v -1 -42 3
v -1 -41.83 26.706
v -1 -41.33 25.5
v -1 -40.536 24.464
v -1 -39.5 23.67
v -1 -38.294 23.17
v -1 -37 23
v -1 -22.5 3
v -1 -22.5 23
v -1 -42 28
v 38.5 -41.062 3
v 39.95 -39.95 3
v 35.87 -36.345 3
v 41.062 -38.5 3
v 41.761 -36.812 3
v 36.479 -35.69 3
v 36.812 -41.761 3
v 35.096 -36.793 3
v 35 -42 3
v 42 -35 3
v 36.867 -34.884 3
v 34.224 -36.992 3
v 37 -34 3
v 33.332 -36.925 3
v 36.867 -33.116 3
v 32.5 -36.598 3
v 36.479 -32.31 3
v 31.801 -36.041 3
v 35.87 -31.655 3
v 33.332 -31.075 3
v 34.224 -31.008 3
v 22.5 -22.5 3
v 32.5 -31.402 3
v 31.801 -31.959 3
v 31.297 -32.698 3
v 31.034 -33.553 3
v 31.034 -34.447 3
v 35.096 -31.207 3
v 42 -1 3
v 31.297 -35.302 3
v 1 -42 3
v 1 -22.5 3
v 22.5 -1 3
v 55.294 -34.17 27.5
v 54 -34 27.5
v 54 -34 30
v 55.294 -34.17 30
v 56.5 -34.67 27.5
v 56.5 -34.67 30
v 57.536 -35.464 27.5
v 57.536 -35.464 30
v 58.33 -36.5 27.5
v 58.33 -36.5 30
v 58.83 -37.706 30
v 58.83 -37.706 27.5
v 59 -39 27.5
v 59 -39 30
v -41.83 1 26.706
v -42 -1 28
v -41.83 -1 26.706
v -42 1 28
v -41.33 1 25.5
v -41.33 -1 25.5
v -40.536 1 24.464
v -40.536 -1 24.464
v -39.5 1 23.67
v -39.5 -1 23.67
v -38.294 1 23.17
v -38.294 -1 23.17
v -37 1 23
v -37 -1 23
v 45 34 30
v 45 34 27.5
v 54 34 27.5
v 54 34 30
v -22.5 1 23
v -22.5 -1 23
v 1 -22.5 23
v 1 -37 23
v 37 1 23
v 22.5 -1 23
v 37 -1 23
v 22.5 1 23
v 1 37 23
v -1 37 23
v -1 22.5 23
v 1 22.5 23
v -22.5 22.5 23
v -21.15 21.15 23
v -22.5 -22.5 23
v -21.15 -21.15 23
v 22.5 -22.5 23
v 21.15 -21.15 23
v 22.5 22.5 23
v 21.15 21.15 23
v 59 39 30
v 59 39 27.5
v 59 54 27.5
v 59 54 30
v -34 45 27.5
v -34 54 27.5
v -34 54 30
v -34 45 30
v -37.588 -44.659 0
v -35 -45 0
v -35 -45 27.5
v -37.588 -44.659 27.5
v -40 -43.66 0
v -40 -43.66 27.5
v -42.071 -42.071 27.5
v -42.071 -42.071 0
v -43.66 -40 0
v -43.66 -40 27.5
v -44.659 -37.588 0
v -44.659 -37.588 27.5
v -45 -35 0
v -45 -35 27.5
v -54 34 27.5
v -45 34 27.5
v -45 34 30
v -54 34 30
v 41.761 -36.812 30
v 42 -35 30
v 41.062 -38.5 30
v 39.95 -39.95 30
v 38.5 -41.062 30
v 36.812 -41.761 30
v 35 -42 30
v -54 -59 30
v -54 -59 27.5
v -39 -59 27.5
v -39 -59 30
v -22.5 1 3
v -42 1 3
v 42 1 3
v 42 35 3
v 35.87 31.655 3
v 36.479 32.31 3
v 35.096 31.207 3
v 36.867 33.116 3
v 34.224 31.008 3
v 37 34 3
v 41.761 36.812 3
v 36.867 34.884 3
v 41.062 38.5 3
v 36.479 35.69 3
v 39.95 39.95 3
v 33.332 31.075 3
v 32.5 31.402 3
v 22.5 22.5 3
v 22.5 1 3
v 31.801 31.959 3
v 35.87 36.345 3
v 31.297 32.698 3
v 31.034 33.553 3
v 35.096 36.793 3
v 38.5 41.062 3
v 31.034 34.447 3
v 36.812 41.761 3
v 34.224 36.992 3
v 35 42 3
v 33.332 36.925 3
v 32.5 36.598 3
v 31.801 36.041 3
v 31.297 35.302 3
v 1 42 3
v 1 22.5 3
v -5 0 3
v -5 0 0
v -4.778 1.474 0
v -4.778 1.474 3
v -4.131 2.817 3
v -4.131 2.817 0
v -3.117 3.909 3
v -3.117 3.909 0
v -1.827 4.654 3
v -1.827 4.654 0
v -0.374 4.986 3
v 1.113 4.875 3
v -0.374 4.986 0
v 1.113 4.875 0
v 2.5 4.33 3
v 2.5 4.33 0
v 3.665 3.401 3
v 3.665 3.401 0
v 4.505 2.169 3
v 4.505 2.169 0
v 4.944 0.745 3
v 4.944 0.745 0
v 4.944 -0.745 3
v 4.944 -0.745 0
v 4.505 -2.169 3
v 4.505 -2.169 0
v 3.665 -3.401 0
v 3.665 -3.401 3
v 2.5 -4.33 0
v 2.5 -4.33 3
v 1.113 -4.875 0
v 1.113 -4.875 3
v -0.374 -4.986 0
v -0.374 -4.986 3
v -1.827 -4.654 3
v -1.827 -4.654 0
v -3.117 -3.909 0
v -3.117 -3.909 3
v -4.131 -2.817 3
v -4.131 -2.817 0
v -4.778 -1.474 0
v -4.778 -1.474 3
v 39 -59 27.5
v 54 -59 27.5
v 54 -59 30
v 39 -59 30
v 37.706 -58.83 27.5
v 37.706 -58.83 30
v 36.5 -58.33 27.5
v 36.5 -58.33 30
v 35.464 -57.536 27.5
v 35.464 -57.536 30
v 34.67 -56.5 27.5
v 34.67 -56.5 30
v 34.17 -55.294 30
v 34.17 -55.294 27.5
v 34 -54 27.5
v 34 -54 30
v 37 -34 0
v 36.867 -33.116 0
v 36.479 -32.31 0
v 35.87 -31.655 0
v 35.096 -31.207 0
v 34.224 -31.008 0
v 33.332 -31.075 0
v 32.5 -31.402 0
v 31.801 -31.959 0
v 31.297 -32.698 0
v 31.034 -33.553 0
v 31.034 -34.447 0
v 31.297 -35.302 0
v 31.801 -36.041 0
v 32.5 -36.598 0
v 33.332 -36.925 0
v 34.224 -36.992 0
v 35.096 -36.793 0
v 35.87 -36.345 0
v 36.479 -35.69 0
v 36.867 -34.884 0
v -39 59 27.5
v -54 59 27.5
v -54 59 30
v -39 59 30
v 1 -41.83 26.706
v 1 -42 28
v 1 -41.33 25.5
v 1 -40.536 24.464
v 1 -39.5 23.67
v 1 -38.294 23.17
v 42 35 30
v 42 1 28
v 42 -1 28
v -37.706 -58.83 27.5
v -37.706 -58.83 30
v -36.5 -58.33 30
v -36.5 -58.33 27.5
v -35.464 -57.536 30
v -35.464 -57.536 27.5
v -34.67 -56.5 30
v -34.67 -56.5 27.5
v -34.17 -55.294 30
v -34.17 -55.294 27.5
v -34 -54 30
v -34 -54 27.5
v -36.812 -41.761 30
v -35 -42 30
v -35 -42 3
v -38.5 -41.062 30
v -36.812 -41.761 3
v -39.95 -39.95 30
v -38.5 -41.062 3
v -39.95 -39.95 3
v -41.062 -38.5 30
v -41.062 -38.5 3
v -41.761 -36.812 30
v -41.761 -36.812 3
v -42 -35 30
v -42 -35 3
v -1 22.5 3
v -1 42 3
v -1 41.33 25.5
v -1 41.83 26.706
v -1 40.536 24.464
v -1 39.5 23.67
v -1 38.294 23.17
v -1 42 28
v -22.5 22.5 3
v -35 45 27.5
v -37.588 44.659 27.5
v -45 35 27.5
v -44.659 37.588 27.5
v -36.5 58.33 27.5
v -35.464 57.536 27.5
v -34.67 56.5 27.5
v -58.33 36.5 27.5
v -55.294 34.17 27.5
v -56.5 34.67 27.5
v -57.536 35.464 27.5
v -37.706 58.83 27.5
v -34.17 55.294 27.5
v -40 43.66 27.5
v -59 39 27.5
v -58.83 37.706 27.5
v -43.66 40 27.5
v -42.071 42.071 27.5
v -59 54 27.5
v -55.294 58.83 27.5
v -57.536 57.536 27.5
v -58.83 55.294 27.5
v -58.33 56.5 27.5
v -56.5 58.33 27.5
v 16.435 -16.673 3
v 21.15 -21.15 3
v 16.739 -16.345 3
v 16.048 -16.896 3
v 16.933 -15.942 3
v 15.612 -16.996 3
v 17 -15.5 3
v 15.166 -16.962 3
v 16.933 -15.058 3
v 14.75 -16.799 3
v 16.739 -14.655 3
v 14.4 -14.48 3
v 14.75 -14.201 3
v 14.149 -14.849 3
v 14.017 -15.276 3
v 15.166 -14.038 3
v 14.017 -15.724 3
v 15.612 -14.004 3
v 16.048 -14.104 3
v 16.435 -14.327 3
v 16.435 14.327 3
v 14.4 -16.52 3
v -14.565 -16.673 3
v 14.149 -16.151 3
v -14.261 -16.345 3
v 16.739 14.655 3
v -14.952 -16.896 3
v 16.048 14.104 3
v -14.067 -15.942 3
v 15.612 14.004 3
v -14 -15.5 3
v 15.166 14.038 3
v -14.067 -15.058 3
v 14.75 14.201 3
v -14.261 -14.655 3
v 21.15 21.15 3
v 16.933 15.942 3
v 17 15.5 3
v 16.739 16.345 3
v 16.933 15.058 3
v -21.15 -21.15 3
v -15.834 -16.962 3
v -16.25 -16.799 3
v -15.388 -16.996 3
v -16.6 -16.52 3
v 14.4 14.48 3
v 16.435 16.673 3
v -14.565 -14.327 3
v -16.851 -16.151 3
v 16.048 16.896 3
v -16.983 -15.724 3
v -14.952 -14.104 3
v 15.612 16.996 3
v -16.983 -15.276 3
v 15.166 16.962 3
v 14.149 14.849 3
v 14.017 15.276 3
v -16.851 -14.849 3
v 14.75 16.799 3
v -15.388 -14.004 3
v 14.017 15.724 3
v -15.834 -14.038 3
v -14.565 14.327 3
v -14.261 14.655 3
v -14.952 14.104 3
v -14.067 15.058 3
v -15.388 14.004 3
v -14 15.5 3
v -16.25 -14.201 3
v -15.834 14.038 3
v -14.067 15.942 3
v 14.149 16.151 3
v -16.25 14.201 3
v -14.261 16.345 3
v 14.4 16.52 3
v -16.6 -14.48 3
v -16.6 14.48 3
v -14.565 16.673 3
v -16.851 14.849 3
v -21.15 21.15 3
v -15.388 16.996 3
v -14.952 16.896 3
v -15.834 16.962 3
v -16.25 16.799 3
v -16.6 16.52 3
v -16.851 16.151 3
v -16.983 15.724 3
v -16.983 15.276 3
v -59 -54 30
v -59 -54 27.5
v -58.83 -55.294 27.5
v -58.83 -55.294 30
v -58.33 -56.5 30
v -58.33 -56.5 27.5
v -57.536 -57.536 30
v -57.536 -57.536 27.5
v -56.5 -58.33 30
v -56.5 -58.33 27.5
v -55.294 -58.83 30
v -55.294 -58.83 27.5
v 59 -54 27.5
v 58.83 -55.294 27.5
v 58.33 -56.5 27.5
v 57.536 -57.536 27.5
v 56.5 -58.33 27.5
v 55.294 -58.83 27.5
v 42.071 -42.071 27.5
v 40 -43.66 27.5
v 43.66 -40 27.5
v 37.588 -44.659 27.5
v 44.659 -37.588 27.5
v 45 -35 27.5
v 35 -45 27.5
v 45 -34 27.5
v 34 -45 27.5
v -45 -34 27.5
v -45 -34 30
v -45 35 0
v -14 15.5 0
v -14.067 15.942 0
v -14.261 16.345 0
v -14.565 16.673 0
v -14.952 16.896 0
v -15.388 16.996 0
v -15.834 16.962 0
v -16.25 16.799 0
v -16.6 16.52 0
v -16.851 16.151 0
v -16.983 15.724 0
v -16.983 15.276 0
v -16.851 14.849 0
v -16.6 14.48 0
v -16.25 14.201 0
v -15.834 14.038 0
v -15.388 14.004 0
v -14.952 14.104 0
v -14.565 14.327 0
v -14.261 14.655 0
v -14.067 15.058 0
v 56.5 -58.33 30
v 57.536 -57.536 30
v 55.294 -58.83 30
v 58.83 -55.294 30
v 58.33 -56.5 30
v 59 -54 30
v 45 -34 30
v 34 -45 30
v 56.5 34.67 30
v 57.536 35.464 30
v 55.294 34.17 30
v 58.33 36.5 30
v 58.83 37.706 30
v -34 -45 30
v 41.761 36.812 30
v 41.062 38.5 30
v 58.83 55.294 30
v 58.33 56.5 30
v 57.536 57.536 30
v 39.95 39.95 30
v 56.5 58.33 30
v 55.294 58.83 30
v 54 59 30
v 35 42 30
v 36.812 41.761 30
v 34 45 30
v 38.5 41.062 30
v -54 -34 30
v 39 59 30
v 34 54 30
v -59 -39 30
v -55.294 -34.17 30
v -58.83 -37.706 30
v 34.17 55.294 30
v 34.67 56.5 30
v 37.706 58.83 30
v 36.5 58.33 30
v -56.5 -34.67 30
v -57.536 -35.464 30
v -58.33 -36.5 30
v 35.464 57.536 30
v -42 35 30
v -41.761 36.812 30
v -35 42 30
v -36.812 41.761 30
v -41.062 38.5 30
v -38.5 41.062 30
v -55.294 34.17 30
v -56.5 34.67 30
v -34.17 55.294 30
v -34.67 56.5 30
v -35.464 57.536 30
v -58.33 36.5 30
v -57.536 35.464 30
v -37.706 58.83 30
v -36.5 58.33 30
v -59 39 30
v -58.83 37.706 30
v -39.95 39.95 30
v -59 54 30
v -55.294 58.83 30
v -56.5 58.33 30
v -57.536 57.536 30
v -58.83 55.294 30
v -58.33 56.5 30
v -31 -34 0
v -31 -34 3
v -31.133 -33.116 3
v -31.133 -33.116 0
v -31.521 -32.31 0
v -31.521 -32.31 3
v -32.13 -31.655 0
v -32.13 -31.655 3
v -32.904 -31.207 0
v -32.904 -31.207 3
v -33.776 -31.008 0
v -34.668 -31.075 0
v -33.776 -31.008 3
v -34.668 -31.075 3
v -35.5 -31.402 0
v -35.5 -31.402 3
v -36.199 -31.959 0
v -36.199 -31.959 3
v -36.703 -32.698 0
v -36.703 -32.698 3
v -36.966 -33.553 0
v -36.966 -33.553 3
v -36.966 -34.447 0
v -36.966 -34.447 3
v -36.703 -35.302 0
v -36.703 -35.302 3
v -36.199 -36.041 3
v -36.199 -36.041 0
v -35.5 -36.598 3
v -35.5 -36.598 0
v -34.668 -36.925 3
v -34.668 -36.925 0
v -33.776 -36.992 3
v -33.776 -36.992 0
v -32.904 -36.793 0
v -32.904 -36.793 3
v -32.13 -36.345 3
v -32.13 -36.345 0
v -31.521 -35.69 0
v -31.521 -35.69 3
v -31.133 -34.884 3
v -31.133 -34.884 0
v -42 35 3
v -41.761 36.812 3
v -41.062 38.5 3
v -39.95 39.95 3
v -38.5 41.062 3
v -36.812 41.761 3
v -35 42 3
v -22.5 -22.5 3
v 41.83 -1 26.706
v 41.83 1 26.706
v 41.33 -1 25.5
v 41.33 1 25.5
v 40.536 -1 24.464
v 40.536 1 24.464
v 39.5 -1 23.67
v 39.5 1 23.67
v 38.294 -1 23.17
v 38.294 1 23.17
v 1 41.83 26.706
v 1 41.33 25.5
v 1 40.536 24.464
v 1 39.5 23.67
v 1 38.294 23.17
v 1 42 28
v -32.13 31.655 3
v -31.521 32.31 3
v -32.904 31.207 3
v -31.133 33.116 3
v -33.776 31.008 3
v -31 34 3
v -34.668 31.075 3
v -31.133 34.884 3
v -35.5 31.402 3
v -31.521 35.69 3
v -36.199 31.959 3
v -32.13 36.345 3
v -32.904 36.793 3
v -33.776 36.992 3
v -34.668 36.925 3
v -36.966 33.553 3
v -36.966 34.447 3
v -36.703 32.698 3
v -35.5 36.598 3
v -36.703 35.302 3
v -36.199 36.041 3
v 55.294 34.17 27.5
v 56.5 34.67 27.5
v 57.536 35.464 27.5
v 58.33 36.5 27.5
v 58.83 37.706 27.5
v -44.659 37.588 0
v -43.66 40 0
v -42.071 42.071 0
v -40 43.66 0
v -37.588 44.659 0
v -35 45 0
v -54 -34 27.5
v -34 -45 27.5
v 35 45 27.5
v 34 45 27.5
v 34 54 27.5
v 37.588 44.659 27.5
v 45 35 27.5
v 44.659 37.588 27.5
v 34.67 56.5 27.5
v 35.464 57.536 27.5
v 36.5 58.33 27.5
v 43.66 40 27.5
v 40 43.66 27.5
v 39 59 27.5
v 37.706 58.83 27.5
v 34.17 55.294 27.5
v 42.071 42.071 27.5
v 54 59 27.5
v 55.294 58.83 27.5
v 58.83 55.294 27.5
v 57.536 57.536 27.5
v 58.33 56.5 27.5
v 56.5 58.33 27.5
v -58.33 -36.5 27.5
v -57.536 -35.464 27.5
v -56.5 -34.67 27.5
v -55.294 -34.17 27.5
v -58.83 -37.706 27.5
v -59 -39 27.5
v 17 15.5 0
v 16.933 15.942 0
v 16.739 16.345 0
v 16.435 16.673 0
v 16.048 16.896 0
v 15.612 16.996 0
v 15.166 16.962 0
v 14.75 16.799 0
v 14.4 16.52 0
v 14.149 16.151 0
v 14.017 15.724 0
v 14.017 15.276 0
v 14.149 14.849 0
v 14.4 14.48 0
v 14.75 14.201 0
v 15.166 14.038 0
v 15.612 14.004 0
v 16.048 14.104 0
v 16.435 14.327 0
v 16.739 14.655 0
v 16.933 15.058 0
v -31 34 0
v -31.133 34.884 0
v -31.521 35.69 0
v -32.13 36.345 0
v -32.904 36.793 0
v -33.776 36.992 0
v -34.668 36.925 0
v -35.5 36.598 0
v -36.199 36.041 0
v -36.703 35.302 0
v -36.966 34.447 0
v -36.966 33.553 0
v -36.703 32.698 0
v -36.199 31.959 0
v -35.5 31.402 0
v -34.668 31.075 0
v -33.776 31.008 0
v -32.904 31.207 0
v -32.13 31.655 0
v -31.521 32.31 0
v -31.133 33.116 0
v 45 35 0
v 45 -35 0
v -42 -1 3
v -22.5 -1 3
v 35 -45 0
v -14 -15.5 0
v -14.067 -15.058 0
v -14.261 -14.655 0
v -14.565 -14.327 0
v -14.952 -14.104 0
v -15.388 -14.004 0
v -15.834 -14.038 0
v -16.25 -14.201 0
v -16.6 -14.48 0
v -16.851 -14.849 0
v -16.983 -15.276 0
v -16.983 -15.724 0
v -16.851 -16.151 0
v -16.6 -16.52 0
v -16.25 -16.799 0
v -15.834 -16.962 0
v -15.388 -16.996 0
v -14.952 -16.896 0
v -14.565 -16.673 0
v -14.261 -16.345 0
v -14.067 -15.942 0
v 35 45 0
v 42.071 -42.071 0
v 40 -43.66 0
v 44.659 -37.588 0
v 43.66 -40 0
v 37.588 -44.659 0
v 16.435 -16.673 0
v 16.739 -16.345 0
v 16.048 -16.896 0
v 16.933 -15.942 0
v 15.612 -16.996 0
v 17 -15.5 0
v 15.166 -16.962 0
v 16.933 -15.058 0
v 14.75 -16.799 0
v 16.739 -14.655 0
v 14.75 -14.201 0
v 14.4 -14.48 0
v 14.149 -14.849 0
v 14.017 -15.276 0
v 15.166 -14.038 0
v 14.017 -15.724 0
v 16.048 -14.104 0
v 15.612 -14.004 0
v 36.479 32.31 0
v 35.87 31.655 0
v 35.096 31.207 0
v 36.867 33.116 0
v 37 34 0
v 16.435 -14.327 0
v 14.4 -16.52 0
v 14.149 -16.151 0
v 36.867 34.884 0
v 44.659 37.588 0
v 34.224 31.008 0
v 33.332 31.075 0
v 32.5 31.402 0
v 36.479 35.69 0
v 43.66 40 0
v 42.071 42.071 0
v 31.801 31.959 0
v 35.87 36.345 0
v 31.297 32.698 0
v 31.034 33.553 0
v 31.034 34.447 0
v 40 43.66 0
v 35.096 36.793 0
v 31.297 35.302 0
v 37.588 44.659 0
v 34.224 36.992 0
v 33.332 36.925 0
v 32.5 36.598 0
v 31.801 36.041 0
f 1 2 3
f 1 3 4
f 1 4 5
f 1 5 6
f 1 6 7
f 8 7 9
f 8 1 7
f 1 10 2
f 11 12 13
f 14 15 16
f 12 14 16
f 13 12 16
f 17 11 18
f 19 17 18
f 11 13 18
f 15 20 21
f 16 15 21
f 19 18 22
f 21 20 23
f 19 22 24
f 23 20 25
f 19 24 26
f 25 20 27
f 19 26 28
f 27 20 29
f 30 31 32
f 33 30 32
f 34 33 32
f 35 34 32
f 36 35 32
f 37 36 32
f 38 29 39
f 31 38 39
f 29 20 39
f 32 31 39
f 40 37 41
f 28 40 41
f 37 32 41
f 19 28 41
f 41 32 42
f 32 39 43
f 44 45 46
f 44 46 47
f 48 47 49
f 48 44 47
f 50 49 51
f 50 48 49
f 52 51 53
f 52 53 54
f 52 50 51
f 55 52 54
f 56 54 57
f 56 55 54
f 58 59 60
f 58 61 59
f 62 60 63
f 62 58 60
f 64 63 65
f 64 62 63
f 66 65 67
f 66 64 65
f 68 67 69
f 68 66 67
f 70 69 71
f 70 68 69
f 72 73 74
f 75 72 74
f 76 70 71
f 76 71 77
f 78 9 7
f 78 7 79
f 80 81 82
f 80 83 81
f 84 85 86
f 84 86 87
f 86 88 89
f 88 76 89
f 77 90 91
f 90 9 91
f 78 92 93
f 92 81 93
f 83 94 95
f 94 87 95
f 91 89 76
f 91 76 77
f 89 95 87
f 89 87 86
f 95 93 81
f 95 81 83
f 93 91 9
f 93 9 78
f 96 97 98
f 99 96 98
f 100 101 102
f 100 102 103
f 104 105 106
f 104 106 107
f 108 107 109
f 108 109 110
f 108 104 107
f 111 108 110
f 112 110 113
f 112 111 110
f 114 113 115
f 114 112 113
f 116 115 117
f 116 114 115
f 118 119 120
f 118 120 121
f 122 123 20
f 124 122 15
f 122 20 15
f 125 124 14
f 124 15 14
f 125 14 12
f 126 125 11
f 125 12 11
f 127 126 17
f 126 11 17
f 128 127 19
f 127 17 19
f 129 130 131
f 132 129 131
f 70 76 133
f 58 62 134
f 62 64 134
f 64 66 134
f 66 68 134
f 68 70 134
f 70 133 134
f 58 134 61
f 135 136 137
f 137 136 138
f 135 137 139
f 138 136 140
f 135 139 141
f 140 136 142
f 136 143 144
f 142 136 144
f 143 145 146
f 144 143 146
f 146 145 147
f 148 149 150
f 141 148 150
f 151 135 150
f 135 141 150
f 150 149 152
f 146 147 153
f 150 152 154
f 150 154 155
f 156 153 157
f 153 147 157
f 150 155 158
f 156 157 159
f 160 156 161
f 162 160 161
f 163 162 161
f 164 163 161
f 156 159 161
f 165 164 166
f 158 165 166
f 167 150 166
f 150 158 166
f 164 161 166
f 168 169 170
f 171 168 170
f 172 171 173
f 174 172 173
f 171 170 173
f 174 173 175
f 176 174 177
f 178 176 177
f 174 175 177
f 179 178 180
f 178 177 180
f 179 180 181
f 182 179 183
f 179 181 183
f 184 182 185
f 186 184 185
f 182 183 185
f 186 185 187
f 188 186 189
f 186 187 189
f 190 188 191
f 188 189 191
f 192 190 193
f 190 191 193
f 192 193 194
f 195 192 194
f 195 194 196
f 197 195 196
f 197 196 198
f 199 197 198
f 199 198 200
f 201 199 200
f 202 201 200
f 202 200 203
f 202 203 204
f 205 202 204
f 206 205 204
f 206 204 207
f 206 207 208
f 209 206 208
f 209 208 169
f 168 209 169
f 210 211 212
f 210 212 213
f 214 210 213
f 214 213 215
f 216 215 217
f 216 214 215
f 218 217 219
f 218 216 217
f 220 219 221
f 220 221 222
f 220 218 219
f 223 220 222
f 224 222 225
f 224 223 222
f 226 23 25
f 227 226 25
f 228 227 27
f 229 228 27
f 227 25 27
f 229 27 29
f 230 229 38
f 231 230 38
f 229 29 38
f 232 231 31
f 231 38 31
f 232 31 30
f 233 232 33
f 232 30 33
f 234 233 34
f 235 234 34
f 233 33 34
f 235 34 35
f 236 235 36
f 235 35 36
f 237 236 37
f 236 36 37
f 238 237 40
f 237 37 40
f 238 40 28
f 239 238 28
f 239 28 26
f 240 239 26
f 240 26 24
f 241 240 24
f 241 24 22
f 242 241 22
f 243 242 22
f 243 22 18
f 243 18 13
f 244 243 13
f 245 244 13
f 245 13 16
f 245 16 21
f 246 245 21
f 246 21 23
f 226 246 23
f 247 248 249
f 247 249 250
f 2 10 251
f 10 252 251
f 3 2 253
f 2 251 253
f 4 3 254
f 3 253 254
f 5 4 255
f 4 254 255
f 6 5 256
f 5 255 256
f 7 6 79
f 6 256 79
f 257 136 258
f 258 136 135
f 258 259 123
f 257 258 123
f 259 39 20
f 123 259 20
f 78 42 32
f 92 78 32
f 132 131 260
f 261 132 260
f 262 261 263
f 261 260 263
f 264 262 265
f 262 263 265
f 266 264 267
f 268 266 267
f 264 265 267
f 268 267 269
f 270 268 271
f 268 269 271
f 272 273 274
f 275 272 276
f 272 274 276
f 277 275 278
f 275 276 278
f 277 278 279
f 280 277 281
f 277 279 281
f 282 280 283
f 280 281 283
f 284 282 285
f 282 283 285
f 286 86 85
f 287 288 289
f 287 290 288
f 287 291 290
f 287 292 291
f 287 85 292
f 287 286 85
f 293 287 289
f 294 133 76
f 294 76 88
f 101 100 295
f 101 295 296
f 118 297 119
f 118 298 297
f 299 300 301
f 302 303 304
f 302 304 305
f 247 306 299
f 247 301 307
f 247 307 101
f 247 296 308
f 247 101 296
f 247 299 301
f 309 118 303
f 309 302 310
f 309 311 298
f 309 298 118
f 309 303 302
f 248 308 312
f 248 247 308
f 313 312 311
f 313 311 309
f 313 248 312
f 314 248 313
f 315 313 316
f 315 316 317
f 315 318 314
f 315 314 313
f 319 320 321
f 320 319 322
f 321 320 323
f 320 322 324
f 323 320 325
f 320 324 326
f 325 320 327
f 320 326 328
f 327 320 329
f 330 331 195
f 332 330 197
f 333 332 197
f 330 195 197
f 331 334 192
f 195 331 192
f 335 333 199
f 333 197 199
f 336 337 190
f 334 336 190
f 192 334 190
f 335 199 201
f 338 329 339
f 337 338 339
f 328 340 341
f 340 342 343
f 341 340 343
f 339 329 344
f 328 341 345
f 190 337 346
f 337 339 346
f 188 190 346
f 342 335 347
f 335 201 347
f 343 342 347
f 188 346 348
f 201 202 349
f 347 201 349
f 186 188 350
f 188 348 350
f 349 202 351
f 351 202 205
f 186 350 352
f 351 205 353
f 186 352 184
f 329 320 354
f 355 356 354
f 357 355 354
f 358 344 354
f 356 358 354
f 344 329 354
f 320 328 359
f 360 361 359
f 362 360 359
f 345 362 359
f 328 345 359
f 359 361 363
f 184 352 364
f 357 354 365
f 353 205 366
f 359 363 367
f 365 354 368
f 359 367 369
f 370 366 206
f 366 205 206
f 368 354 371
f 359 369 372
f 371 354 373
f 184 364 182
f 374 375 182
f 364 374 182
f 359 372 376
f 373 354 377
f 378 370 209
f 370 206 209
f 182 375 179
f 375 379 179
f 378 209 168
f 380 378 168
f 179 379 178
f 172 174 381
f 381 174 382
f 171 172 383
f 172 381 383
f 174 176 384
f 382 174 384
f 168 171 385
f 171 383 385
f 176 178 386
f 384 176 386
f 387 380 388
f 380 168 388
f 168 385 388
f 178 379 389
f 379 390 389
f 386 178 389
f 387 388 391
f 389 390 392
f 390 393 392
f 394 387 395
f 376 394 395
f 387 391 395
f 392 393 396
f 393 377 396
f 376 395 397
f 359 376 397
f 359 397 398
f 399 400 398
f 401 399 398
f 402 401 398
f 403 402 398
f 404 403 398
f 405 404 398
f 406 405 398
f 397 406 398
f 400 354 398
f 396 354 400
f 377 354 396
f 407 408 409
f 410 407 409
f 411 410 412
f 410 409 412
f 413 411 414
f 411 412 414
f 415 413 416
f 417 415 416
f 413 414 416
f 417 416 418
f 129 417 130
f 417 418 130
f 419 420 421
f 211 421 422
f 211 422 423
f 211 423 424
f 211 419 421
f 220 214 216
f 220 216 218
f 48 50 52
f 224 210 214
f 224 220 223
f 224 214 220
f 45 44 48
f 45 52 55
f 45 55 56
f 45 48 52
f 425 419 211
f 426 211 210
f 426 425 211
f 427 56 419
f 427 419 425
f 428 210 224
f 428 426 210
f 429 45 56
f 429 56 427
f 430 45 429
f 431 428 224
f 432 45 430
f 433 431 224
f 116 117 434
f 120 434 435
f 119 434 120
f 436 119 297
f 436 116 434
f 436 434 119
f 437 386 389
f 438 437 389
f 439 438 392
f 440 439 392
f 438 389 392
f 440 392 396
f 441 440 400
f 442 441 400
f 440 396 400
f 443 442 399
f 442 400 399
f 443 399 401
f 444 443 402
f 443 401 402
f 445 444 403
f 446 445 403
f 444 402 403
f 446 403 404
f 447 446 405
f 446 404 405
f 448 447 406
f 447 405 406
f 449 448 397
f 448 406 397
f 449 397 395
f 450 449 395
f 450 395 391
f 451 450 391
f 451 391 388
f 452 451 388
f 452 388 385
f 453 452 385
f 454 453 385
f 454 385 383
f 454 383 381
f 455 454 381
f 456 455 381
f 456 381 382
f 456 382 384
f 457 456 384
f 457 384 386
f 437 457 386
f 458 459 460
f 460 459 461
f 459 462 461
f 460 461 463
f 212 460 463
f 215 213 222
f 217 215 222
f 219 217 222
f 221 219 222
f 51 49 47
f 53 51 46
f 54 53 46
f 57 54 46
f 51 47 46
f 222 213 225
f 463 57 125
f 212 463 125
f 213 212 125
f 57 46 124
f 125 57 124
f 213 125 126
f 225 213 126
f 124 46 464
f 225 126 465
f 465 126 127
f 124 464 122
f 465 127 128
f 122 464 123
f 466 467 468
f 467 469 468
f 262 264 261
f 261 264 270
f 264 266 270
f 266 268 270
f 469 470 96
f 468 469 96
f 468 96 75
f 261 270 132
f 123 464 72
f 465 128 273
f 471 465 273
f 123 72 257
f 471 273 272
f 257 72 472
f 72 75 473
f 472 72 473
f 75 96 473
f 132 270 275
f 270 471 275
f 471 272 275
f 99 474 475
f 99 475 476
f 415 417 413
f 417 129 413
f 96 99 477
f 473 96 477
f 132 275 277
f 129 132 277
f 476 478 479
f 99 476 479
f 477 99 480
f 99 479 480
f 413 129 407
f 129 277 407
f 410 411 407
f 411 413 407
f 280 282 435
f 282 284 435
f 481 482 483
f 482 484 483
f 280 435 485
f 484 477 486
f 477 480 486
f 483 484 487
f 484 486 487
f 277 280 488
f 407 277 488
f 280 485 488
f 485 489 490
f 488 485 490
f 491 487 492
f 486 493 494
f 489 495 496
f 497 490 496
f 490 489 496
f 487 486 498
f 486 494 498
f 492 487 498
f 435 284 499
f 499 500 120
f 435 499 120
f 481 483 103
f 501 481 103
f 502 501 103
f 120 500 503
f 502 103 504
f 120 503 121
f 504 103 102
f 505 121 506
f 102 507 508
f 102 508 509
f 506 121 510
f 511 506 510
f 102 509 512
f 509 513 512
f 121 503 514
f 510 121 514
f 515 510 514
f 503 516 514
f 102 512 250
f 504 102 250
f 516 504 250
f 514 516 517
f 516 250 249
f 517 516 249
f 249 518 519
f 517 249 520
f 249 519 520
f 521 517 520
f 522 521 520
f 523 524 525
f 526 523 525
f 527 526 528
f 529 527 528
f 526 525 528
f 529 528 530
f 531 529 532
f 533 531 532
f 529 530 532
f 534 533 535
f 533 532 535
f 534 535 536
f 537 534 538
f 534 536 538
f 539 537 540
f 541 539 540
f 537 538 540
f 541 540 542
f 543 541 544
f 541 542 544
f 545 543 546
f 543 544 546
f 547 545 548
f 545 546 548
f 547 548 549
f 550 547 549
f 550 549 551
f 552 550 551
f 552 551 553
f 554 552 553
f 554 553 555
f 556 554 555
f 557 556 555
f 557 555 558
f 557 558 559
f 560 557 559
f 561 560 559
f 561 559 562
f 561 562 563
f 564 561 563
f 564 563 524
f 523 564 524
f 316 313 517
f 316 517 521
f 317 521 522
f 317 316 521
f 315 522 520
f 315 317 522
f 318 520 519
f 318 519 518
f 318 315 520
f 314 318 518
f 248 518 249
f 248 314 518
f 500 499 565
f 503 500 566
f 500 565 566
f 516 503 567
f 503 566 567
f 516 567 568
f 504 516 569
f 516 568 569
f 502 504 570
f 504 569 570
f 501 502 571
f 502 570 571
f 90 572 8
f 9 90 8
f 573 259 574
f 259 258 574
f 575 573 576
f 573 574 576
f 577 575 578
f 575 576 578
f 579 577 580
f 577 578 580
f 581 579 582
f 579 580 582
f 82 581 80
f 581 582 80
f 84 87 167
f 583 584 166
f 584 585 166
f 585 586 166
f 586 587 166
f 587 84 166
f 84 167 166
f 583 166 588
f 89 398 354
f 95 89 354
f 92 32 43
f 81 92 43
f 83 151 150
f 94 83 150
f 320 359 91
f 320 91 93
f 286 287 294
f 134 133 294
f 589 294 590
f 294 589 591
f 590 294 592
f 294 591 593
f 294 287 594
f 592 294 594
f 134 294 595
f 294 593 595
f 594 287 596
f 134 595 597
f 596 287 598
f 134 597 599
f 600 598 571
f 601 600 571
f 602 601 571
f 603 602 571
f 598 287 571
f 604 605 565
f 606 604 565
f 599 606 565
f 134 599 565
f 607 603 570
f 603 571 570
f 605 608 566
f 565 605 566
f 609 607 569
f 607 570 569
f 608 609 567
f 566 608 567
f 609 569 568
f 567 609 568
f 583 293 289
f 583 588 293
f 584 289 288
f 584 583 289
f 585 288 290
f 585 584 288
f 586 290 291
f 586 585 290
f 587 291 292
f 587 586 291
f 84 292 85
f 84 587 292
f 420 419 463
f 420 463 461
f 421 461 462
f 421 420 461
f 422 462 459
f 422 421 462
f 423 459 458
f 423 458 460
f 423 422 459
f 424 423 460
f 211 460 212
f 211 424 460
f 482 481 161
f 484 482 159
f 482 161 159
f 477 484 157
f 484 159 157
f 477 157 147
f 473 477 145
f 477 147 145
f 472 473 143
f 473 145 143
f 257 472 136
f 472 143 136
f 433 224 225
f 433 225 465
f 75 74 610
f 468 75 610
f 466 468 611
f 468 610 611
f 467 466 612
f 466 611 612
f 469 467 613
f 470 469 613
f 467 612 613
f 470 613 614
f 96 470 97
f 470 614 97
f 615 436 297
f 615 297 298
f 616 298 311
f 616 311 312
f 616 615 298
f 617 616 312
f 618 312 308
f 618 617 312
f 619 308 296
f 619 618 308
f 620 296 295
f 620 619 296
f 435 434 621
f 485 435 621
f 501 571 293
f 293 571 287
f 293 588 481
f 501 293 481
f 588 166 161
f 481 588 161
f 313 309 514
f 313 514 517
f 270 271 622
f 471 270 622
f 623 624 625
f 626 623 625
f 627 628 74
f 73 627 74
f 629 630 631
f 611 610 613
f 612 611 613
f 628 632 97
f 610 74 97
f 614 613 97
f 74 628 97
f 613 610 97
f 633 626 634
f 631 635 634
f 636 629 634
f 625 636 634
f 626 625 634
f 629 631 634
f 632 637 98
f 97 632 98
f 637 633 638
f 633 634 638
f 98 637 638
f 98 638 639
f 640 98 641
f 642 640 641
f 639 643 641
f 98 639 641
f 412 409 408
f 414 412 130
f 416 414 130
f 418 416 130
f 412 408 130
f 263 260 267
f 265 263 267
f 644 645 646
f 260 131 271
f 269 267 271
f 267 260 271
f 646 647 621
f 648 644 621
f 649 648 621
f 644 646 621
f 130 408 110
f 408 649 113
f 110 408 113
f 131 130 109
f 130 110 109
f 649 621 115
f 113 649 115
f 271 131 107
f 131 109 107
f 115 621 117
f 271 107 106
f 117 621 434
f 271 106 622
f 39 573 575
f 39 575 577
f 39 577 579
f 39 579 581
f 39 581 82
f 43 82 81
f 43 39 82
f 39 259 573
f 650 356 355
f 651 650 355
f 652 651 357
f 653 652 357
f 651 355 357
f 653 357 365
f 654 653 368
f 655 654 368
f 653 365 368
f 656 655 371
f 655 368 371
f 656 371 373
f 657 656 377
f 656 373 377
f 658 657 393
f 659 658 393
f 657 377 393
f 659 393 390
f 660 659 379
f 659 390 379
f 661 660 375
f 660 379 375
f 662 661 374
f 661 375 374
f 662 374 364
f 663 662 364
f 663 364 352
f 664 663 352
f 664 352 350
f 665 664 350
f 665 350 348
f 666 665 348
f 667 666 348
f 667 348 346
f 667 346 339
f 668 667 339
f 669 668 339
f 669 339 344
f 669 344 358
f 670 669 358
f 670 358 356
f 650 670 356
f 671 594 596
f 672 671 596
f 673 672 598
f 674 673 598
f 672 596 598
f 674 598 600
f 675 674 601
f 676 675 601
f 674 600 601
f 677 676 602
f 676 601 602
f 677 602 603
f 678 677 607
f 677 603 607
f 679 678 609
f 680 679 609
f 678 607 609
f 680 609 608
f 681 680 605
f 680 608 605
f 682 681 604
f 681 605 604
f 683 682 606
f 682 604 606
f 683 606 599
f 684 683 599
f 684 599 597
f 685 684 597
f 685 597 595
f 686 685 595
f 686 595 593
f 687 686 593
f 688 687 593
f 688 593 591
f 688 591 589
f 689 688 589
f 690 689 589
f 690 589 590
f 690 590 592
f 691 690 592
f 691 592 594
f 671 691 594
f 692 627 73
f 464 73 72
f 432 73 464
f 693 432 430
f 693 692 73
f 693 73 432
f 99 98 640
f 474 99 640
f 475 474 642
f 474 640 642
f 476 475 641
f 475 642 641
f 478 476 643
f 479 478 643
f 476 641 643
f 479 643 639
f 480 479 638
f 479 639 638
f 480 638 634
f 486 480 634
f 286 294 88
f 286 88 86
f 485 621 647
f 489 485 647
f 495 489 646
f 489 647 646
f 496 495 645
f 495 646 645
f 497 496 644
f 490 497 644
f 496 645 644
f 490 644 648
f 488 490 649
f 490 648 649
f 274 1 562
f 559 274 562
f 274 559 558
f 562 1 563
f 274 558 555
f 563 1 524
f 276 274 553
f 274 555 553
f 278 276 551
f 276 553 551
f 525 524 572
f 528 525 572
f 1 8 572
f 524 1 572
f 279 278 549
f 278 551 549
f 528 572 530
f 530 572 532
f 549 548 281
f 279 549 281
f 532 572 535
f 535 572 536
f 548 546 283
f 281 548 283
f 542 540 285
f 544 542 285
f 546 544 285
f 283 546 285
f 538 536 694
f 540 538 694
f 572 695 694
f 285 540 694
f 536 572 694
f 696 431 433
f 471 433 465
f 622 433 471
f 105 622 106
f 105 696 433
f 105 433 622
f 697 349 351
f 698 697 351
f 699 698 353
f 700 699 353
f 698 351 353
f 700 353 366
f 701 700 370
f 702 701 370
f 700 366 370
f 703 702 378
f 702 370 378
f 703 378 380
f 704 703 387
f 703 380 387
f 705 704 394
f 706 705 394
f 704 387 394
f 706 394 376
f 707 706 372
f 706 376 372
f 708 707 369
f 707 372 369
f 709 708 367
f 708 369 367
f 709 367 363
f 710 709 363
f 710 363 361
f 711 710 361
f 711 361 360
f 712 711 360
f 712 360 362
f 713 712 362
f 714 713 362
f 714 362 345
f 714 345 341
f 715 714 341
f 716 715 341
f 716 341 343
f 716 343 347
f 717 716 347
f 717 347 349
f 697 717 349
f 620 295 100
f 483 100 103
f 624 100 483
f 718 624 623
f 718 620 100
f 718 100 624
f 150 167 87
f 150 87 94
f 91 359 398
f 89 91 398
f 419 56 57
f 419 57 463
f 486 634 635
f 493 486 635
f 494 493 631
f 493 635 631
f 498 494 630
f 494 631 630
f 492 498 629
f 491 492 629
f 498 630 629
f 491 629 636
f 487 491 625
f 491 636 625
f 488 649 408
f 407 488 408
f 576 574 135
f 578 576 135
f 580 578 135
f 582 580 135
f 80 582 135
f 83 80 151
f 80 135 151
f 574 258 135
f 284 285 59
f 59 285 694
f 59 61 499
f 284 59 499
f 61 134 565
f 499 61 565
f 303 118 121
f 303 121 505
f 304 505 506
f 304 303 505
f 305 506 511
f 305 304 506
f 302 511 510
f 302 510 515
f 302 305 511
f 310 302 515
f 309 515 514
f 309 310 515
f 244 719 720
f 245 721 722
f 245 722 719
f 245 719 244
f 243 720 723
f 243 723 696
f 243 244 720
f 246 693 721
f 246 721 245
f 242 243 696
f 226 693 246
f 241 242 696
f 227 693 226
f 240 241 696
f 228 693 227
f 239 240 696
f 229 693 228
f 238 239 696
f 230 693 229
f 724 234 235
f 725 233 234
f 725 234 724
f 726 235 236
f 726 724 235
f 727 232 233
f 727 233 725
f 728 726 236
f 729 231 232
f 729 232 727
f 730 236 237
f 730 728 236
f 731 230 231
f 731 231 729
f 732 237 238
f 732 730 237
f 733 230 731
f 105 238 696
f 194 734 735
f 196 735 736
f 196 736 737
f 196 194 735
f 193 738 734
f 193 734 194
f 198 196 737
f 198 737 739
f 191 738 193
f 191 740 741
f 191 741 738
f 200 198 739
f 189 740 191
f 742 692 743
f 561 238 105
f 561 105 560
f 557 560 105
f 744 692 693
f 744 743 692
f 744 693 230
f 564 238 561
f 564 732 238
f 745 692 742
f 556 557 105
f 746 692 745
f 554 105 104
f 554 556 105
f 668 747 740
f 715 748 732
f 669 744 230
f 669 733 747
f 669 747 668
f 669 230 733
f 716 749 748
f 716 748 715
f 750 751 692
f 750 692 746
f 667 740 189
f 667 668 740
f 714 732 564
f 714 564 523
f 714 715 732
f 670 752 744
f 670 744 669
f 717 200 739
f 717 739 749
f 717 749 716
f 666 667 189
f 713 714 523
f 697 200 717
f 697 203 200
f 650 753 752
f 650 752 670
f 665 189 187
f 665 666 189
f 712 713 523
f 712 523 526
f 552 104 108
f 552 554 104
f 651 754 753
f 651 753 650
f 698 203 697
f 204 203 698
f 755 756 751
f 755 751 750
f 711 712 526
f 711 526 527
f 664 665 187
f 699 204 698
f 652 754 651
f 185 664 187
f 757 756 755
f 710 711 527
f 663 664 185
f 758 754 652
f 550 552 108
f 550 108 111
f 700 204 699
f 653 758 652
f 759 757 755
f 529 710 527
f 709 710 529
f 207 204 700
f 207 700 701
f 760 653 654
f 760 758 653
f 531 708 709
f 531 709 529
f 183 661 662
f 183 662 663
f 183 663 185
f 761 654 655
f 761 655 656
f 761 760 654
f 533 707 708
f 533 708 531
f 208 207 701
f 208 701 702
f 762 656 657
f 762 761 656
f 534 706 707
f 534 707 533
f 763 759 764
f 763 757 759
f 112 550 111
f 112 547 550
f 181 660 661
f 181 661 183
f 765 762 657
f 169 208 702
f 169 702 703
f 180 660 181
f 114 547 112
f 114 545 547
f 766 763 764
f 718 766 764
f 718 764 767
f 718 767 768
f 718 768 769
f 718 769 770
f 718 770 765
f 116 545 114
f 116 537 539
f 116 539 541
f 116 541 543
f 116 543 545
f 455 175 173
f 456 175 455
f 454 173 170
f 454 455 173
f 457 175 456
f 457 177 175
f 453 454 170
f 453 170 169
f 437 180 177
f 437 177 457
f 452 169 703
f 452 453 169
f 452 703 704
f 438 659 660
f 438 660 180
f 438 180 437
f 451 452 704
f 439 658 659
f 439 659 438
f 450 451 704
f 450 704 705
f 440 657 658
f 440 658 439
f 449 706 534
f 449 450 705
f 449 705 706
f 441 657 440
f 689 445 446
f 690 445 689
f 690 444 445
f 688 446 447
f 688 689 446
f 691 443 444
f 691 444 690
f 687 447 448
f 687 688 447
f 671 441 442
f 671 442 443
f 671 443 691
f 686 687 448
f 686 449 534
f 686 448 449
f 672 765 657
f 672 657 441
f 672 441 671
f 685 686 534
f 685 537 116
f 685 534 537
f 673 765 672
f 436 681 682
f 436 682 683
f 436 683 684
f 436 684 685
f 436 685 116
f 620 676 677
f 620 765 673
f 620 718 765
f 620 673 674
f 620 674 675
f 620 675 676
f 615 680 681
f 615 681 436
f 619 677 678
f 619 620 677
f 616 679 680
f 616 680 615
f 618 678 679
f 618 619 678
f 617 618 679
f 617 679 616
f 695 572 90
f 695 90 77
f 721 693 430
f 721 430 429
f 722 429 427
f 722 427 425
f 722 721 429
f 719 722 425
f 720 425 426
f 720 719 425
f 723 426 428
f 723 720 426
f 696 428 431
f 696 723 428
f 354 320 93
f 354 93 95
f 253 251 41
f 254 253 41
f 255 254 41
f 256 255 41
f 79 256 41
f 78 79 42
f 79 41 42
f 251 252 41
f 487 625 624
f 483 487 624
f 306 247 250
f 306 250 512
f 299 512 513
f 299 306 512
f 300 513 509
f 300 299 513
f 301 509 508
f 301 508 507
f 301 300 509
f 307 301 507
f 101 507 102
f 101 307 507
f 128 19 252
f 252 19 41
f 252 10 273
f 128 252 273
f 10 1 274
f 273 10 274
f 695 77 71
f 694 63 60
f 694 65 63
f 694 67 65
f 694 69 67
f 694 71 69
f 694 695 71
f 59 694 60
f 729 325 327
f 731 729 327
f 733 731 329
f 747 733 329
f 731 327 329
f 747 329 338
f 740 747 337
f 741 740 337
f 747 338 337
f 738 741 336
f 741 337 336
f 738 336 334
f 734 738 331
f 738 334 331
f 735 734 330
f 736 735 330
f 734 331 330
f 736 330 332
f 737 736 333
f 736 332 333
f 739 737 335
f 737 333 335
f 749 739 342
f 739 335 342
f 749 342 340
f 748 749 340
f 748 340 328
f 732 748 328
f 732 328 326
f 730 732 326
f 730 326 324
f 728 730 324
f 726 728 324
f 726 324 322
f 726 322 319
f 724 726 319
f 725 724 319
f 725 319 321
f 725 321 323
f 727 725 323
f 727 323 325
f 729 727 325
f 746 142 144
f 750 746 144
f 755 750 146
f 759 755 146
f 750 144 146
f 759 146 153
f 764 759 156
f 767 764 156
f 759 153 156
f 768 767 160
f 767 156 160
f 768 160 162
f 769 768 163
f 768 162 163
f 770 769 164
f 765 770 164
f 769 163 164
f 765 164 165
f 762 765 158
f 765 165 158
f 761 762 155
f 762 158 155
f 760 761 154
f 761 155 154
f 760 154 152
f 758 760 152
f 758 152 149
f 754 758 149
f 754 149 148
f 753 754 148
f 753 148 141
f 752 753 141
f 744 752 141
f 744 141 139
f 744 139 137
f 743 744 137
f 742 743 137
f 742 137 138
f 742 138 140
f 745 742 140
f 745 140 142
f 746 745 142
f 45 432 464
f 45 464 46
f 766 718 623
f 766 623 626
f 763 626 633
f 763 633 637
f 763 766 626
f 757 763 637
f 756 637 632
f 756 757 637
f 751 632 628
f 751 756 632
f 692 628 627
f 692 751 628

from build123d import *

# Parameters (mm, degrees)
EXTRUDE_1_DEPTH          = 30
SHELL_1_T                = -3
CUT_EXTRUDE_1_REACH      = 72.356
SKETCH_3_R               = 3
SKETCH_4_W               = 45
SKETCH_4_H               = 45
SKETCH_4_W_2             = 42.3
SKETCH_4_H_2             = 42.3
EXTRUDE_3_DEPTH          = 20
SKETCH_11_R              = 1.5
CUT_EXTRUDE_4_DEPTH      = 70.130311731
SKETCH_7_W               = 2
SKETCH_7_H               = 19.5
EXTRUDE_5_DEPTH          = 20
PATTERN_CIRCULAR_1_COUNT = 2
PATTERN_CIRCULAR_1_ANGLE = 90
SKETCH_10_R              = 5
CUT_EXTRUDE_3_DEPTH      = 71.356236397
FILLET_1_R               = 5
EXTRUDE_START            = -2.5
EXTRUDE_6_DEPTH          = 2.5


with BuildPart() as part:
    # 草图1 → 凸台-拉伸1 (new body)
    with BuildSketch(Plane.XY):
        with BuildLine():
            Line((-35, 45), (35, 45))
            ThreePointArc((35, 45), (42.071067812, 42.071067812), (45, 35))
            Line((45, 35), (45, -35))
            ThreePointArc((45, -35), (42.071067812, -42.071067812), (35, -45))
            Line((35, -45), (-35, -45))
            ThreePointArc((-35, -45), (-42.071067812, -42.071067812), (-45, -35))
            Line((-45, -35), (-45, 35))
            ThreePointArc((-45, 35), (-42.071067812, 42.071067812), (-35, 45))
        make_face()
    extrude(amount=EXTRUDE_1_DEPTH)

    # 抽壳1
    shell_1_openings = [part.faces().sort_by_distance(p)[0] for p in [
        (0, 0, 30),
    ]]
    offset(amount=SHELL_1_T, openings=shell_1_openings, kind=Kind.INTERSECTION)

    # 草图3 → 切除-拉伸1 (cut, up to next)
    with BuildSketch(Plane.XY.offset(30), mode=Mode.PRIVATE) as cut_extrude_1_sk1:
        with Locations((-34, 34)):
            Circle(SKETCH_3_R)
    cut_extrude_1_tool1 = extrude(cut_extrude_1_sk1.sketch, amount=-CUT_EXTRUDE_1_REACH, mode=Mode.PRIVATE) & part.part
    # 草图3 → 切除-拉伸1 (cut, up to next)
    with BuildSketch(Plane.XY.offset(30), mode=Mode.PRIVATE) as cut_extrude_1_sk2:
        with Locations((34, 34)):
            Circle(SKETCH_3_R)
    cut_extrude_1_tool2 = extrude(cut_extrude_1_sk2.sketch, amount=-CUT_EXTRUDE_1_REACH, mode=Mode.PRIVATE) & part.part
    # 草图3 → 切除-拉伸1 (cut, up to next)
    with BuildSketch(Plane.XY.offset(30), mode=Mode.PRIVATE) as cut_extrude_1_sk3:
        with Locations((34, -34)):
            Circle(SKETCH_3_R)
    cut_extrude_1_tool3 = extrude(cut_extrude_1_sk3.sketch, amount=-CUT_EXTRUDE_1_REACH, mode=Mode.PRIVATE) & part.part
    # 草图3 → 切除-拉伸1 (cut, up to next)
    with BuildSketch(Plane.XY.offset(30), mode=Mode.PRIVATE) as cut_extrude_1_sk4:
        with Locations((-34, -34)):
            Circle(SKETCH_3_R)
    cut_extrude_1_tool4 = extrude(cut_extrude_1_sk4.sketch, amount=-CUT_EXTRUDE_1_REACH, mode=Mode.PRIVATE) & part.part
    add(cut_extrude_1_tool1.solids().sort_by_distance((-34, 34, 30))[0], mode=Mode.SUBTRACT)
    add(cut_extrude_1_tool2.solids().sort_by_distance((34, 34, 30))[0], mode=Mode.SUBTRACT)
    add(cut_extrude_1_tool3.solids().sort_by_distance((34, -34, 30))[0], mode=Mode.SUBTRACT)
    add(cut_extrude_1_tool4.solids().sort_by_distance((-34, -34, 30))[0], mode=Mode.SUBTRACT)

    # 草图4 → 凸台-拉伸3 (add)
    with BuildSketch(Plane.XY.offset(3)):
        Rectangle(SKETCH_4_W, SKETCH_4_H)
        Rectangle(SKETCH_4_W_2, SKETCH_4_H_2, mode=Mode.SUBTRACT)
    extrude(amount=EXTRUDE_3_DEPTH)

    # 草图11 → 切除-拉伸4 (cut, through all)
    with BuildSketch(Plane.XY.offset(3)):
        with Locations((-15.5, -15.5)):
            Circle(SKETCH_11_R)
        with Locations((15.5, -15.5)):
            Circle(SKETCH_11_R)
        with Locations((15.5, 15.5)):
            Circle(SKETCH_11_R)
        with Locations((-15.5, 15.5)):
            Circle(SKETCH_11_R)
    extrude(amount=-CUT_EXTRUDE_4_DEPTH, mode=Mode.SUBTRACT)

    # 草图7 → 凸台-拉伸5 (add)
    with BuildSketch(Plane.XY.offset(3)):
        with Locations((0, 32.25)):
            Rectangle(SKETCH_7_W, SKETCH_7_H)
        with Locations((0, -32.25)):
            Rectangle(SKETCH_7_W, SKETCH_7_H)
    extrude_5 = extrude(amount=EXTRUDE_5_DEPTH)

    # 阵列(圆周)1: 凸台-拉伸5 ×2 about axis
    pattern_circular_1_axis = Axis((0, 0, -2), (0, 0, 1))
    for i in range(1, PATTERN_CIRCULAR_1_COUNT):
        add(extrude_5.rotate(pattern_circular_1_axis, i * PATTERN_CIRCULAR_1_ANGLE / (PATTERN_CIRCULAR_1_COUNT - 1)))

    # 草图10 → 切除-拉伸3 (cut, through all)
    with BuildSketch(Plane(origin=(0, 0, 0), x_dir=(-1, 0, 0), z_dir=(0, 0, -1))):
        Circle(SKETCH_10_R)
    extrude(amount=-CUT_EXTRUDE_3_DEPTH, mode=Mode.SUBTRACT)

    # 圆角1
    fillet_1_edges = [part.edges().sort_by_distance(p)[0] for p in [
        (0, 42, 23),
        (0, -42, 23),
        (-42, 0, 23),
        (42, 0, 23),
    ]]
    fillet(fillet_1_edges, radius=FILLET_1_R)

    # 草图12 → 凸台-拉伸6 (add)
    with BuildSketch(Plane.XY.offset(30).offset(EXTRUDE_START)):
        with BuildLine():
            Line((34, 42), (35, 42))
            ThreePointArc((35, 42), (39.949747468, 39.949747468), (42, 35))
            Line((42, 35), (42, 34))
            Line((42, 34), (54, 34))
            ThreePointArc((54, 34), (57.535533906, 35.464466094), (59, 39))
            Line((59, 39), (59, 54))
            ThreePointArc((59, 54), (57.535533906, 57.535533906), (54, 59))
            Line((54, 59), (39, 59))
            ThreePointArc((39, 59), (35.464466094, 57.535533906), (34, 54))
            Line((34, 54), (34, 42))
        make_face()
        with BuildLine():
            Line((42, -34), (54, -34))
            ThreePointArc((54, -34), (57.535533906, -35.464466094), (59, -39))
            Line((59, -39), (59, -54))
            ThreePointArc((59, -54), (57.535533906, -57.535533906), (54, -59))
            Line((54, -59), (39, -59))
            ThreePointArc((39, -59), (35.464466094, -57.535533906), (34, -54))
            Line((34, -54), (34, -42))
            Line((34, -42), (35, -42))
            ThreePointArc((35, -42), (39.949747468, -39.949747468), (42, -35))
            Line((42, -35), (42, -34))
        make_face()
        with BuildLine():
            Line((-42, -35), (-42, -34))
            Line((-42, -34), (-54, -34))
            ThreePointArc((-54, -34), (-57.535533906, -35.464466094), (-59, -39))
            Line((-59, -39), (-59, -54))
            ThreePointArc((-59, -54), (-57.535533906, -57.535533906), (-54, -59))
            Line((-54, -59), (-39, -59))
            ThreePointArc((-39, -59), (-35.464466094, -57.535533906), (-34, -54))
            Line((-34, -54), (-34, -42))
            Line((-34, -42), (-35, -42))
            ThreePointArc((-35, -42), (-39.949747468, -39.949747468), (-42, -35))
        make_face()
        with BuildLine():
            Line((-42, 35), (-42, 34))
            Line((-42, 34), (-54, 34))
            ThreePointArc((-54, 34), (-57.535533906, 35.464466094), (-59, 39))
            Line((-59, 39), (-59, 54))
            ThreePointArc((-59, 54), (-57.535533906, 57.535533906), (-54, 59))
            Line((-54, 59), (-39, 59))
            ThreePointArc((-39, 59), (-35.464466094, 57.535533906), (-34, 54))
            Line((-34, 54), (-34, 42))
            Line((-34, 42), (-35, 42))
            ThreePointArc((-35, 42), (-39.949747468, 39.949747468), (-42, 35))
        make_face()
    extrude(amount=EXTRUDE_6_DEPTH)


solid = part.part
